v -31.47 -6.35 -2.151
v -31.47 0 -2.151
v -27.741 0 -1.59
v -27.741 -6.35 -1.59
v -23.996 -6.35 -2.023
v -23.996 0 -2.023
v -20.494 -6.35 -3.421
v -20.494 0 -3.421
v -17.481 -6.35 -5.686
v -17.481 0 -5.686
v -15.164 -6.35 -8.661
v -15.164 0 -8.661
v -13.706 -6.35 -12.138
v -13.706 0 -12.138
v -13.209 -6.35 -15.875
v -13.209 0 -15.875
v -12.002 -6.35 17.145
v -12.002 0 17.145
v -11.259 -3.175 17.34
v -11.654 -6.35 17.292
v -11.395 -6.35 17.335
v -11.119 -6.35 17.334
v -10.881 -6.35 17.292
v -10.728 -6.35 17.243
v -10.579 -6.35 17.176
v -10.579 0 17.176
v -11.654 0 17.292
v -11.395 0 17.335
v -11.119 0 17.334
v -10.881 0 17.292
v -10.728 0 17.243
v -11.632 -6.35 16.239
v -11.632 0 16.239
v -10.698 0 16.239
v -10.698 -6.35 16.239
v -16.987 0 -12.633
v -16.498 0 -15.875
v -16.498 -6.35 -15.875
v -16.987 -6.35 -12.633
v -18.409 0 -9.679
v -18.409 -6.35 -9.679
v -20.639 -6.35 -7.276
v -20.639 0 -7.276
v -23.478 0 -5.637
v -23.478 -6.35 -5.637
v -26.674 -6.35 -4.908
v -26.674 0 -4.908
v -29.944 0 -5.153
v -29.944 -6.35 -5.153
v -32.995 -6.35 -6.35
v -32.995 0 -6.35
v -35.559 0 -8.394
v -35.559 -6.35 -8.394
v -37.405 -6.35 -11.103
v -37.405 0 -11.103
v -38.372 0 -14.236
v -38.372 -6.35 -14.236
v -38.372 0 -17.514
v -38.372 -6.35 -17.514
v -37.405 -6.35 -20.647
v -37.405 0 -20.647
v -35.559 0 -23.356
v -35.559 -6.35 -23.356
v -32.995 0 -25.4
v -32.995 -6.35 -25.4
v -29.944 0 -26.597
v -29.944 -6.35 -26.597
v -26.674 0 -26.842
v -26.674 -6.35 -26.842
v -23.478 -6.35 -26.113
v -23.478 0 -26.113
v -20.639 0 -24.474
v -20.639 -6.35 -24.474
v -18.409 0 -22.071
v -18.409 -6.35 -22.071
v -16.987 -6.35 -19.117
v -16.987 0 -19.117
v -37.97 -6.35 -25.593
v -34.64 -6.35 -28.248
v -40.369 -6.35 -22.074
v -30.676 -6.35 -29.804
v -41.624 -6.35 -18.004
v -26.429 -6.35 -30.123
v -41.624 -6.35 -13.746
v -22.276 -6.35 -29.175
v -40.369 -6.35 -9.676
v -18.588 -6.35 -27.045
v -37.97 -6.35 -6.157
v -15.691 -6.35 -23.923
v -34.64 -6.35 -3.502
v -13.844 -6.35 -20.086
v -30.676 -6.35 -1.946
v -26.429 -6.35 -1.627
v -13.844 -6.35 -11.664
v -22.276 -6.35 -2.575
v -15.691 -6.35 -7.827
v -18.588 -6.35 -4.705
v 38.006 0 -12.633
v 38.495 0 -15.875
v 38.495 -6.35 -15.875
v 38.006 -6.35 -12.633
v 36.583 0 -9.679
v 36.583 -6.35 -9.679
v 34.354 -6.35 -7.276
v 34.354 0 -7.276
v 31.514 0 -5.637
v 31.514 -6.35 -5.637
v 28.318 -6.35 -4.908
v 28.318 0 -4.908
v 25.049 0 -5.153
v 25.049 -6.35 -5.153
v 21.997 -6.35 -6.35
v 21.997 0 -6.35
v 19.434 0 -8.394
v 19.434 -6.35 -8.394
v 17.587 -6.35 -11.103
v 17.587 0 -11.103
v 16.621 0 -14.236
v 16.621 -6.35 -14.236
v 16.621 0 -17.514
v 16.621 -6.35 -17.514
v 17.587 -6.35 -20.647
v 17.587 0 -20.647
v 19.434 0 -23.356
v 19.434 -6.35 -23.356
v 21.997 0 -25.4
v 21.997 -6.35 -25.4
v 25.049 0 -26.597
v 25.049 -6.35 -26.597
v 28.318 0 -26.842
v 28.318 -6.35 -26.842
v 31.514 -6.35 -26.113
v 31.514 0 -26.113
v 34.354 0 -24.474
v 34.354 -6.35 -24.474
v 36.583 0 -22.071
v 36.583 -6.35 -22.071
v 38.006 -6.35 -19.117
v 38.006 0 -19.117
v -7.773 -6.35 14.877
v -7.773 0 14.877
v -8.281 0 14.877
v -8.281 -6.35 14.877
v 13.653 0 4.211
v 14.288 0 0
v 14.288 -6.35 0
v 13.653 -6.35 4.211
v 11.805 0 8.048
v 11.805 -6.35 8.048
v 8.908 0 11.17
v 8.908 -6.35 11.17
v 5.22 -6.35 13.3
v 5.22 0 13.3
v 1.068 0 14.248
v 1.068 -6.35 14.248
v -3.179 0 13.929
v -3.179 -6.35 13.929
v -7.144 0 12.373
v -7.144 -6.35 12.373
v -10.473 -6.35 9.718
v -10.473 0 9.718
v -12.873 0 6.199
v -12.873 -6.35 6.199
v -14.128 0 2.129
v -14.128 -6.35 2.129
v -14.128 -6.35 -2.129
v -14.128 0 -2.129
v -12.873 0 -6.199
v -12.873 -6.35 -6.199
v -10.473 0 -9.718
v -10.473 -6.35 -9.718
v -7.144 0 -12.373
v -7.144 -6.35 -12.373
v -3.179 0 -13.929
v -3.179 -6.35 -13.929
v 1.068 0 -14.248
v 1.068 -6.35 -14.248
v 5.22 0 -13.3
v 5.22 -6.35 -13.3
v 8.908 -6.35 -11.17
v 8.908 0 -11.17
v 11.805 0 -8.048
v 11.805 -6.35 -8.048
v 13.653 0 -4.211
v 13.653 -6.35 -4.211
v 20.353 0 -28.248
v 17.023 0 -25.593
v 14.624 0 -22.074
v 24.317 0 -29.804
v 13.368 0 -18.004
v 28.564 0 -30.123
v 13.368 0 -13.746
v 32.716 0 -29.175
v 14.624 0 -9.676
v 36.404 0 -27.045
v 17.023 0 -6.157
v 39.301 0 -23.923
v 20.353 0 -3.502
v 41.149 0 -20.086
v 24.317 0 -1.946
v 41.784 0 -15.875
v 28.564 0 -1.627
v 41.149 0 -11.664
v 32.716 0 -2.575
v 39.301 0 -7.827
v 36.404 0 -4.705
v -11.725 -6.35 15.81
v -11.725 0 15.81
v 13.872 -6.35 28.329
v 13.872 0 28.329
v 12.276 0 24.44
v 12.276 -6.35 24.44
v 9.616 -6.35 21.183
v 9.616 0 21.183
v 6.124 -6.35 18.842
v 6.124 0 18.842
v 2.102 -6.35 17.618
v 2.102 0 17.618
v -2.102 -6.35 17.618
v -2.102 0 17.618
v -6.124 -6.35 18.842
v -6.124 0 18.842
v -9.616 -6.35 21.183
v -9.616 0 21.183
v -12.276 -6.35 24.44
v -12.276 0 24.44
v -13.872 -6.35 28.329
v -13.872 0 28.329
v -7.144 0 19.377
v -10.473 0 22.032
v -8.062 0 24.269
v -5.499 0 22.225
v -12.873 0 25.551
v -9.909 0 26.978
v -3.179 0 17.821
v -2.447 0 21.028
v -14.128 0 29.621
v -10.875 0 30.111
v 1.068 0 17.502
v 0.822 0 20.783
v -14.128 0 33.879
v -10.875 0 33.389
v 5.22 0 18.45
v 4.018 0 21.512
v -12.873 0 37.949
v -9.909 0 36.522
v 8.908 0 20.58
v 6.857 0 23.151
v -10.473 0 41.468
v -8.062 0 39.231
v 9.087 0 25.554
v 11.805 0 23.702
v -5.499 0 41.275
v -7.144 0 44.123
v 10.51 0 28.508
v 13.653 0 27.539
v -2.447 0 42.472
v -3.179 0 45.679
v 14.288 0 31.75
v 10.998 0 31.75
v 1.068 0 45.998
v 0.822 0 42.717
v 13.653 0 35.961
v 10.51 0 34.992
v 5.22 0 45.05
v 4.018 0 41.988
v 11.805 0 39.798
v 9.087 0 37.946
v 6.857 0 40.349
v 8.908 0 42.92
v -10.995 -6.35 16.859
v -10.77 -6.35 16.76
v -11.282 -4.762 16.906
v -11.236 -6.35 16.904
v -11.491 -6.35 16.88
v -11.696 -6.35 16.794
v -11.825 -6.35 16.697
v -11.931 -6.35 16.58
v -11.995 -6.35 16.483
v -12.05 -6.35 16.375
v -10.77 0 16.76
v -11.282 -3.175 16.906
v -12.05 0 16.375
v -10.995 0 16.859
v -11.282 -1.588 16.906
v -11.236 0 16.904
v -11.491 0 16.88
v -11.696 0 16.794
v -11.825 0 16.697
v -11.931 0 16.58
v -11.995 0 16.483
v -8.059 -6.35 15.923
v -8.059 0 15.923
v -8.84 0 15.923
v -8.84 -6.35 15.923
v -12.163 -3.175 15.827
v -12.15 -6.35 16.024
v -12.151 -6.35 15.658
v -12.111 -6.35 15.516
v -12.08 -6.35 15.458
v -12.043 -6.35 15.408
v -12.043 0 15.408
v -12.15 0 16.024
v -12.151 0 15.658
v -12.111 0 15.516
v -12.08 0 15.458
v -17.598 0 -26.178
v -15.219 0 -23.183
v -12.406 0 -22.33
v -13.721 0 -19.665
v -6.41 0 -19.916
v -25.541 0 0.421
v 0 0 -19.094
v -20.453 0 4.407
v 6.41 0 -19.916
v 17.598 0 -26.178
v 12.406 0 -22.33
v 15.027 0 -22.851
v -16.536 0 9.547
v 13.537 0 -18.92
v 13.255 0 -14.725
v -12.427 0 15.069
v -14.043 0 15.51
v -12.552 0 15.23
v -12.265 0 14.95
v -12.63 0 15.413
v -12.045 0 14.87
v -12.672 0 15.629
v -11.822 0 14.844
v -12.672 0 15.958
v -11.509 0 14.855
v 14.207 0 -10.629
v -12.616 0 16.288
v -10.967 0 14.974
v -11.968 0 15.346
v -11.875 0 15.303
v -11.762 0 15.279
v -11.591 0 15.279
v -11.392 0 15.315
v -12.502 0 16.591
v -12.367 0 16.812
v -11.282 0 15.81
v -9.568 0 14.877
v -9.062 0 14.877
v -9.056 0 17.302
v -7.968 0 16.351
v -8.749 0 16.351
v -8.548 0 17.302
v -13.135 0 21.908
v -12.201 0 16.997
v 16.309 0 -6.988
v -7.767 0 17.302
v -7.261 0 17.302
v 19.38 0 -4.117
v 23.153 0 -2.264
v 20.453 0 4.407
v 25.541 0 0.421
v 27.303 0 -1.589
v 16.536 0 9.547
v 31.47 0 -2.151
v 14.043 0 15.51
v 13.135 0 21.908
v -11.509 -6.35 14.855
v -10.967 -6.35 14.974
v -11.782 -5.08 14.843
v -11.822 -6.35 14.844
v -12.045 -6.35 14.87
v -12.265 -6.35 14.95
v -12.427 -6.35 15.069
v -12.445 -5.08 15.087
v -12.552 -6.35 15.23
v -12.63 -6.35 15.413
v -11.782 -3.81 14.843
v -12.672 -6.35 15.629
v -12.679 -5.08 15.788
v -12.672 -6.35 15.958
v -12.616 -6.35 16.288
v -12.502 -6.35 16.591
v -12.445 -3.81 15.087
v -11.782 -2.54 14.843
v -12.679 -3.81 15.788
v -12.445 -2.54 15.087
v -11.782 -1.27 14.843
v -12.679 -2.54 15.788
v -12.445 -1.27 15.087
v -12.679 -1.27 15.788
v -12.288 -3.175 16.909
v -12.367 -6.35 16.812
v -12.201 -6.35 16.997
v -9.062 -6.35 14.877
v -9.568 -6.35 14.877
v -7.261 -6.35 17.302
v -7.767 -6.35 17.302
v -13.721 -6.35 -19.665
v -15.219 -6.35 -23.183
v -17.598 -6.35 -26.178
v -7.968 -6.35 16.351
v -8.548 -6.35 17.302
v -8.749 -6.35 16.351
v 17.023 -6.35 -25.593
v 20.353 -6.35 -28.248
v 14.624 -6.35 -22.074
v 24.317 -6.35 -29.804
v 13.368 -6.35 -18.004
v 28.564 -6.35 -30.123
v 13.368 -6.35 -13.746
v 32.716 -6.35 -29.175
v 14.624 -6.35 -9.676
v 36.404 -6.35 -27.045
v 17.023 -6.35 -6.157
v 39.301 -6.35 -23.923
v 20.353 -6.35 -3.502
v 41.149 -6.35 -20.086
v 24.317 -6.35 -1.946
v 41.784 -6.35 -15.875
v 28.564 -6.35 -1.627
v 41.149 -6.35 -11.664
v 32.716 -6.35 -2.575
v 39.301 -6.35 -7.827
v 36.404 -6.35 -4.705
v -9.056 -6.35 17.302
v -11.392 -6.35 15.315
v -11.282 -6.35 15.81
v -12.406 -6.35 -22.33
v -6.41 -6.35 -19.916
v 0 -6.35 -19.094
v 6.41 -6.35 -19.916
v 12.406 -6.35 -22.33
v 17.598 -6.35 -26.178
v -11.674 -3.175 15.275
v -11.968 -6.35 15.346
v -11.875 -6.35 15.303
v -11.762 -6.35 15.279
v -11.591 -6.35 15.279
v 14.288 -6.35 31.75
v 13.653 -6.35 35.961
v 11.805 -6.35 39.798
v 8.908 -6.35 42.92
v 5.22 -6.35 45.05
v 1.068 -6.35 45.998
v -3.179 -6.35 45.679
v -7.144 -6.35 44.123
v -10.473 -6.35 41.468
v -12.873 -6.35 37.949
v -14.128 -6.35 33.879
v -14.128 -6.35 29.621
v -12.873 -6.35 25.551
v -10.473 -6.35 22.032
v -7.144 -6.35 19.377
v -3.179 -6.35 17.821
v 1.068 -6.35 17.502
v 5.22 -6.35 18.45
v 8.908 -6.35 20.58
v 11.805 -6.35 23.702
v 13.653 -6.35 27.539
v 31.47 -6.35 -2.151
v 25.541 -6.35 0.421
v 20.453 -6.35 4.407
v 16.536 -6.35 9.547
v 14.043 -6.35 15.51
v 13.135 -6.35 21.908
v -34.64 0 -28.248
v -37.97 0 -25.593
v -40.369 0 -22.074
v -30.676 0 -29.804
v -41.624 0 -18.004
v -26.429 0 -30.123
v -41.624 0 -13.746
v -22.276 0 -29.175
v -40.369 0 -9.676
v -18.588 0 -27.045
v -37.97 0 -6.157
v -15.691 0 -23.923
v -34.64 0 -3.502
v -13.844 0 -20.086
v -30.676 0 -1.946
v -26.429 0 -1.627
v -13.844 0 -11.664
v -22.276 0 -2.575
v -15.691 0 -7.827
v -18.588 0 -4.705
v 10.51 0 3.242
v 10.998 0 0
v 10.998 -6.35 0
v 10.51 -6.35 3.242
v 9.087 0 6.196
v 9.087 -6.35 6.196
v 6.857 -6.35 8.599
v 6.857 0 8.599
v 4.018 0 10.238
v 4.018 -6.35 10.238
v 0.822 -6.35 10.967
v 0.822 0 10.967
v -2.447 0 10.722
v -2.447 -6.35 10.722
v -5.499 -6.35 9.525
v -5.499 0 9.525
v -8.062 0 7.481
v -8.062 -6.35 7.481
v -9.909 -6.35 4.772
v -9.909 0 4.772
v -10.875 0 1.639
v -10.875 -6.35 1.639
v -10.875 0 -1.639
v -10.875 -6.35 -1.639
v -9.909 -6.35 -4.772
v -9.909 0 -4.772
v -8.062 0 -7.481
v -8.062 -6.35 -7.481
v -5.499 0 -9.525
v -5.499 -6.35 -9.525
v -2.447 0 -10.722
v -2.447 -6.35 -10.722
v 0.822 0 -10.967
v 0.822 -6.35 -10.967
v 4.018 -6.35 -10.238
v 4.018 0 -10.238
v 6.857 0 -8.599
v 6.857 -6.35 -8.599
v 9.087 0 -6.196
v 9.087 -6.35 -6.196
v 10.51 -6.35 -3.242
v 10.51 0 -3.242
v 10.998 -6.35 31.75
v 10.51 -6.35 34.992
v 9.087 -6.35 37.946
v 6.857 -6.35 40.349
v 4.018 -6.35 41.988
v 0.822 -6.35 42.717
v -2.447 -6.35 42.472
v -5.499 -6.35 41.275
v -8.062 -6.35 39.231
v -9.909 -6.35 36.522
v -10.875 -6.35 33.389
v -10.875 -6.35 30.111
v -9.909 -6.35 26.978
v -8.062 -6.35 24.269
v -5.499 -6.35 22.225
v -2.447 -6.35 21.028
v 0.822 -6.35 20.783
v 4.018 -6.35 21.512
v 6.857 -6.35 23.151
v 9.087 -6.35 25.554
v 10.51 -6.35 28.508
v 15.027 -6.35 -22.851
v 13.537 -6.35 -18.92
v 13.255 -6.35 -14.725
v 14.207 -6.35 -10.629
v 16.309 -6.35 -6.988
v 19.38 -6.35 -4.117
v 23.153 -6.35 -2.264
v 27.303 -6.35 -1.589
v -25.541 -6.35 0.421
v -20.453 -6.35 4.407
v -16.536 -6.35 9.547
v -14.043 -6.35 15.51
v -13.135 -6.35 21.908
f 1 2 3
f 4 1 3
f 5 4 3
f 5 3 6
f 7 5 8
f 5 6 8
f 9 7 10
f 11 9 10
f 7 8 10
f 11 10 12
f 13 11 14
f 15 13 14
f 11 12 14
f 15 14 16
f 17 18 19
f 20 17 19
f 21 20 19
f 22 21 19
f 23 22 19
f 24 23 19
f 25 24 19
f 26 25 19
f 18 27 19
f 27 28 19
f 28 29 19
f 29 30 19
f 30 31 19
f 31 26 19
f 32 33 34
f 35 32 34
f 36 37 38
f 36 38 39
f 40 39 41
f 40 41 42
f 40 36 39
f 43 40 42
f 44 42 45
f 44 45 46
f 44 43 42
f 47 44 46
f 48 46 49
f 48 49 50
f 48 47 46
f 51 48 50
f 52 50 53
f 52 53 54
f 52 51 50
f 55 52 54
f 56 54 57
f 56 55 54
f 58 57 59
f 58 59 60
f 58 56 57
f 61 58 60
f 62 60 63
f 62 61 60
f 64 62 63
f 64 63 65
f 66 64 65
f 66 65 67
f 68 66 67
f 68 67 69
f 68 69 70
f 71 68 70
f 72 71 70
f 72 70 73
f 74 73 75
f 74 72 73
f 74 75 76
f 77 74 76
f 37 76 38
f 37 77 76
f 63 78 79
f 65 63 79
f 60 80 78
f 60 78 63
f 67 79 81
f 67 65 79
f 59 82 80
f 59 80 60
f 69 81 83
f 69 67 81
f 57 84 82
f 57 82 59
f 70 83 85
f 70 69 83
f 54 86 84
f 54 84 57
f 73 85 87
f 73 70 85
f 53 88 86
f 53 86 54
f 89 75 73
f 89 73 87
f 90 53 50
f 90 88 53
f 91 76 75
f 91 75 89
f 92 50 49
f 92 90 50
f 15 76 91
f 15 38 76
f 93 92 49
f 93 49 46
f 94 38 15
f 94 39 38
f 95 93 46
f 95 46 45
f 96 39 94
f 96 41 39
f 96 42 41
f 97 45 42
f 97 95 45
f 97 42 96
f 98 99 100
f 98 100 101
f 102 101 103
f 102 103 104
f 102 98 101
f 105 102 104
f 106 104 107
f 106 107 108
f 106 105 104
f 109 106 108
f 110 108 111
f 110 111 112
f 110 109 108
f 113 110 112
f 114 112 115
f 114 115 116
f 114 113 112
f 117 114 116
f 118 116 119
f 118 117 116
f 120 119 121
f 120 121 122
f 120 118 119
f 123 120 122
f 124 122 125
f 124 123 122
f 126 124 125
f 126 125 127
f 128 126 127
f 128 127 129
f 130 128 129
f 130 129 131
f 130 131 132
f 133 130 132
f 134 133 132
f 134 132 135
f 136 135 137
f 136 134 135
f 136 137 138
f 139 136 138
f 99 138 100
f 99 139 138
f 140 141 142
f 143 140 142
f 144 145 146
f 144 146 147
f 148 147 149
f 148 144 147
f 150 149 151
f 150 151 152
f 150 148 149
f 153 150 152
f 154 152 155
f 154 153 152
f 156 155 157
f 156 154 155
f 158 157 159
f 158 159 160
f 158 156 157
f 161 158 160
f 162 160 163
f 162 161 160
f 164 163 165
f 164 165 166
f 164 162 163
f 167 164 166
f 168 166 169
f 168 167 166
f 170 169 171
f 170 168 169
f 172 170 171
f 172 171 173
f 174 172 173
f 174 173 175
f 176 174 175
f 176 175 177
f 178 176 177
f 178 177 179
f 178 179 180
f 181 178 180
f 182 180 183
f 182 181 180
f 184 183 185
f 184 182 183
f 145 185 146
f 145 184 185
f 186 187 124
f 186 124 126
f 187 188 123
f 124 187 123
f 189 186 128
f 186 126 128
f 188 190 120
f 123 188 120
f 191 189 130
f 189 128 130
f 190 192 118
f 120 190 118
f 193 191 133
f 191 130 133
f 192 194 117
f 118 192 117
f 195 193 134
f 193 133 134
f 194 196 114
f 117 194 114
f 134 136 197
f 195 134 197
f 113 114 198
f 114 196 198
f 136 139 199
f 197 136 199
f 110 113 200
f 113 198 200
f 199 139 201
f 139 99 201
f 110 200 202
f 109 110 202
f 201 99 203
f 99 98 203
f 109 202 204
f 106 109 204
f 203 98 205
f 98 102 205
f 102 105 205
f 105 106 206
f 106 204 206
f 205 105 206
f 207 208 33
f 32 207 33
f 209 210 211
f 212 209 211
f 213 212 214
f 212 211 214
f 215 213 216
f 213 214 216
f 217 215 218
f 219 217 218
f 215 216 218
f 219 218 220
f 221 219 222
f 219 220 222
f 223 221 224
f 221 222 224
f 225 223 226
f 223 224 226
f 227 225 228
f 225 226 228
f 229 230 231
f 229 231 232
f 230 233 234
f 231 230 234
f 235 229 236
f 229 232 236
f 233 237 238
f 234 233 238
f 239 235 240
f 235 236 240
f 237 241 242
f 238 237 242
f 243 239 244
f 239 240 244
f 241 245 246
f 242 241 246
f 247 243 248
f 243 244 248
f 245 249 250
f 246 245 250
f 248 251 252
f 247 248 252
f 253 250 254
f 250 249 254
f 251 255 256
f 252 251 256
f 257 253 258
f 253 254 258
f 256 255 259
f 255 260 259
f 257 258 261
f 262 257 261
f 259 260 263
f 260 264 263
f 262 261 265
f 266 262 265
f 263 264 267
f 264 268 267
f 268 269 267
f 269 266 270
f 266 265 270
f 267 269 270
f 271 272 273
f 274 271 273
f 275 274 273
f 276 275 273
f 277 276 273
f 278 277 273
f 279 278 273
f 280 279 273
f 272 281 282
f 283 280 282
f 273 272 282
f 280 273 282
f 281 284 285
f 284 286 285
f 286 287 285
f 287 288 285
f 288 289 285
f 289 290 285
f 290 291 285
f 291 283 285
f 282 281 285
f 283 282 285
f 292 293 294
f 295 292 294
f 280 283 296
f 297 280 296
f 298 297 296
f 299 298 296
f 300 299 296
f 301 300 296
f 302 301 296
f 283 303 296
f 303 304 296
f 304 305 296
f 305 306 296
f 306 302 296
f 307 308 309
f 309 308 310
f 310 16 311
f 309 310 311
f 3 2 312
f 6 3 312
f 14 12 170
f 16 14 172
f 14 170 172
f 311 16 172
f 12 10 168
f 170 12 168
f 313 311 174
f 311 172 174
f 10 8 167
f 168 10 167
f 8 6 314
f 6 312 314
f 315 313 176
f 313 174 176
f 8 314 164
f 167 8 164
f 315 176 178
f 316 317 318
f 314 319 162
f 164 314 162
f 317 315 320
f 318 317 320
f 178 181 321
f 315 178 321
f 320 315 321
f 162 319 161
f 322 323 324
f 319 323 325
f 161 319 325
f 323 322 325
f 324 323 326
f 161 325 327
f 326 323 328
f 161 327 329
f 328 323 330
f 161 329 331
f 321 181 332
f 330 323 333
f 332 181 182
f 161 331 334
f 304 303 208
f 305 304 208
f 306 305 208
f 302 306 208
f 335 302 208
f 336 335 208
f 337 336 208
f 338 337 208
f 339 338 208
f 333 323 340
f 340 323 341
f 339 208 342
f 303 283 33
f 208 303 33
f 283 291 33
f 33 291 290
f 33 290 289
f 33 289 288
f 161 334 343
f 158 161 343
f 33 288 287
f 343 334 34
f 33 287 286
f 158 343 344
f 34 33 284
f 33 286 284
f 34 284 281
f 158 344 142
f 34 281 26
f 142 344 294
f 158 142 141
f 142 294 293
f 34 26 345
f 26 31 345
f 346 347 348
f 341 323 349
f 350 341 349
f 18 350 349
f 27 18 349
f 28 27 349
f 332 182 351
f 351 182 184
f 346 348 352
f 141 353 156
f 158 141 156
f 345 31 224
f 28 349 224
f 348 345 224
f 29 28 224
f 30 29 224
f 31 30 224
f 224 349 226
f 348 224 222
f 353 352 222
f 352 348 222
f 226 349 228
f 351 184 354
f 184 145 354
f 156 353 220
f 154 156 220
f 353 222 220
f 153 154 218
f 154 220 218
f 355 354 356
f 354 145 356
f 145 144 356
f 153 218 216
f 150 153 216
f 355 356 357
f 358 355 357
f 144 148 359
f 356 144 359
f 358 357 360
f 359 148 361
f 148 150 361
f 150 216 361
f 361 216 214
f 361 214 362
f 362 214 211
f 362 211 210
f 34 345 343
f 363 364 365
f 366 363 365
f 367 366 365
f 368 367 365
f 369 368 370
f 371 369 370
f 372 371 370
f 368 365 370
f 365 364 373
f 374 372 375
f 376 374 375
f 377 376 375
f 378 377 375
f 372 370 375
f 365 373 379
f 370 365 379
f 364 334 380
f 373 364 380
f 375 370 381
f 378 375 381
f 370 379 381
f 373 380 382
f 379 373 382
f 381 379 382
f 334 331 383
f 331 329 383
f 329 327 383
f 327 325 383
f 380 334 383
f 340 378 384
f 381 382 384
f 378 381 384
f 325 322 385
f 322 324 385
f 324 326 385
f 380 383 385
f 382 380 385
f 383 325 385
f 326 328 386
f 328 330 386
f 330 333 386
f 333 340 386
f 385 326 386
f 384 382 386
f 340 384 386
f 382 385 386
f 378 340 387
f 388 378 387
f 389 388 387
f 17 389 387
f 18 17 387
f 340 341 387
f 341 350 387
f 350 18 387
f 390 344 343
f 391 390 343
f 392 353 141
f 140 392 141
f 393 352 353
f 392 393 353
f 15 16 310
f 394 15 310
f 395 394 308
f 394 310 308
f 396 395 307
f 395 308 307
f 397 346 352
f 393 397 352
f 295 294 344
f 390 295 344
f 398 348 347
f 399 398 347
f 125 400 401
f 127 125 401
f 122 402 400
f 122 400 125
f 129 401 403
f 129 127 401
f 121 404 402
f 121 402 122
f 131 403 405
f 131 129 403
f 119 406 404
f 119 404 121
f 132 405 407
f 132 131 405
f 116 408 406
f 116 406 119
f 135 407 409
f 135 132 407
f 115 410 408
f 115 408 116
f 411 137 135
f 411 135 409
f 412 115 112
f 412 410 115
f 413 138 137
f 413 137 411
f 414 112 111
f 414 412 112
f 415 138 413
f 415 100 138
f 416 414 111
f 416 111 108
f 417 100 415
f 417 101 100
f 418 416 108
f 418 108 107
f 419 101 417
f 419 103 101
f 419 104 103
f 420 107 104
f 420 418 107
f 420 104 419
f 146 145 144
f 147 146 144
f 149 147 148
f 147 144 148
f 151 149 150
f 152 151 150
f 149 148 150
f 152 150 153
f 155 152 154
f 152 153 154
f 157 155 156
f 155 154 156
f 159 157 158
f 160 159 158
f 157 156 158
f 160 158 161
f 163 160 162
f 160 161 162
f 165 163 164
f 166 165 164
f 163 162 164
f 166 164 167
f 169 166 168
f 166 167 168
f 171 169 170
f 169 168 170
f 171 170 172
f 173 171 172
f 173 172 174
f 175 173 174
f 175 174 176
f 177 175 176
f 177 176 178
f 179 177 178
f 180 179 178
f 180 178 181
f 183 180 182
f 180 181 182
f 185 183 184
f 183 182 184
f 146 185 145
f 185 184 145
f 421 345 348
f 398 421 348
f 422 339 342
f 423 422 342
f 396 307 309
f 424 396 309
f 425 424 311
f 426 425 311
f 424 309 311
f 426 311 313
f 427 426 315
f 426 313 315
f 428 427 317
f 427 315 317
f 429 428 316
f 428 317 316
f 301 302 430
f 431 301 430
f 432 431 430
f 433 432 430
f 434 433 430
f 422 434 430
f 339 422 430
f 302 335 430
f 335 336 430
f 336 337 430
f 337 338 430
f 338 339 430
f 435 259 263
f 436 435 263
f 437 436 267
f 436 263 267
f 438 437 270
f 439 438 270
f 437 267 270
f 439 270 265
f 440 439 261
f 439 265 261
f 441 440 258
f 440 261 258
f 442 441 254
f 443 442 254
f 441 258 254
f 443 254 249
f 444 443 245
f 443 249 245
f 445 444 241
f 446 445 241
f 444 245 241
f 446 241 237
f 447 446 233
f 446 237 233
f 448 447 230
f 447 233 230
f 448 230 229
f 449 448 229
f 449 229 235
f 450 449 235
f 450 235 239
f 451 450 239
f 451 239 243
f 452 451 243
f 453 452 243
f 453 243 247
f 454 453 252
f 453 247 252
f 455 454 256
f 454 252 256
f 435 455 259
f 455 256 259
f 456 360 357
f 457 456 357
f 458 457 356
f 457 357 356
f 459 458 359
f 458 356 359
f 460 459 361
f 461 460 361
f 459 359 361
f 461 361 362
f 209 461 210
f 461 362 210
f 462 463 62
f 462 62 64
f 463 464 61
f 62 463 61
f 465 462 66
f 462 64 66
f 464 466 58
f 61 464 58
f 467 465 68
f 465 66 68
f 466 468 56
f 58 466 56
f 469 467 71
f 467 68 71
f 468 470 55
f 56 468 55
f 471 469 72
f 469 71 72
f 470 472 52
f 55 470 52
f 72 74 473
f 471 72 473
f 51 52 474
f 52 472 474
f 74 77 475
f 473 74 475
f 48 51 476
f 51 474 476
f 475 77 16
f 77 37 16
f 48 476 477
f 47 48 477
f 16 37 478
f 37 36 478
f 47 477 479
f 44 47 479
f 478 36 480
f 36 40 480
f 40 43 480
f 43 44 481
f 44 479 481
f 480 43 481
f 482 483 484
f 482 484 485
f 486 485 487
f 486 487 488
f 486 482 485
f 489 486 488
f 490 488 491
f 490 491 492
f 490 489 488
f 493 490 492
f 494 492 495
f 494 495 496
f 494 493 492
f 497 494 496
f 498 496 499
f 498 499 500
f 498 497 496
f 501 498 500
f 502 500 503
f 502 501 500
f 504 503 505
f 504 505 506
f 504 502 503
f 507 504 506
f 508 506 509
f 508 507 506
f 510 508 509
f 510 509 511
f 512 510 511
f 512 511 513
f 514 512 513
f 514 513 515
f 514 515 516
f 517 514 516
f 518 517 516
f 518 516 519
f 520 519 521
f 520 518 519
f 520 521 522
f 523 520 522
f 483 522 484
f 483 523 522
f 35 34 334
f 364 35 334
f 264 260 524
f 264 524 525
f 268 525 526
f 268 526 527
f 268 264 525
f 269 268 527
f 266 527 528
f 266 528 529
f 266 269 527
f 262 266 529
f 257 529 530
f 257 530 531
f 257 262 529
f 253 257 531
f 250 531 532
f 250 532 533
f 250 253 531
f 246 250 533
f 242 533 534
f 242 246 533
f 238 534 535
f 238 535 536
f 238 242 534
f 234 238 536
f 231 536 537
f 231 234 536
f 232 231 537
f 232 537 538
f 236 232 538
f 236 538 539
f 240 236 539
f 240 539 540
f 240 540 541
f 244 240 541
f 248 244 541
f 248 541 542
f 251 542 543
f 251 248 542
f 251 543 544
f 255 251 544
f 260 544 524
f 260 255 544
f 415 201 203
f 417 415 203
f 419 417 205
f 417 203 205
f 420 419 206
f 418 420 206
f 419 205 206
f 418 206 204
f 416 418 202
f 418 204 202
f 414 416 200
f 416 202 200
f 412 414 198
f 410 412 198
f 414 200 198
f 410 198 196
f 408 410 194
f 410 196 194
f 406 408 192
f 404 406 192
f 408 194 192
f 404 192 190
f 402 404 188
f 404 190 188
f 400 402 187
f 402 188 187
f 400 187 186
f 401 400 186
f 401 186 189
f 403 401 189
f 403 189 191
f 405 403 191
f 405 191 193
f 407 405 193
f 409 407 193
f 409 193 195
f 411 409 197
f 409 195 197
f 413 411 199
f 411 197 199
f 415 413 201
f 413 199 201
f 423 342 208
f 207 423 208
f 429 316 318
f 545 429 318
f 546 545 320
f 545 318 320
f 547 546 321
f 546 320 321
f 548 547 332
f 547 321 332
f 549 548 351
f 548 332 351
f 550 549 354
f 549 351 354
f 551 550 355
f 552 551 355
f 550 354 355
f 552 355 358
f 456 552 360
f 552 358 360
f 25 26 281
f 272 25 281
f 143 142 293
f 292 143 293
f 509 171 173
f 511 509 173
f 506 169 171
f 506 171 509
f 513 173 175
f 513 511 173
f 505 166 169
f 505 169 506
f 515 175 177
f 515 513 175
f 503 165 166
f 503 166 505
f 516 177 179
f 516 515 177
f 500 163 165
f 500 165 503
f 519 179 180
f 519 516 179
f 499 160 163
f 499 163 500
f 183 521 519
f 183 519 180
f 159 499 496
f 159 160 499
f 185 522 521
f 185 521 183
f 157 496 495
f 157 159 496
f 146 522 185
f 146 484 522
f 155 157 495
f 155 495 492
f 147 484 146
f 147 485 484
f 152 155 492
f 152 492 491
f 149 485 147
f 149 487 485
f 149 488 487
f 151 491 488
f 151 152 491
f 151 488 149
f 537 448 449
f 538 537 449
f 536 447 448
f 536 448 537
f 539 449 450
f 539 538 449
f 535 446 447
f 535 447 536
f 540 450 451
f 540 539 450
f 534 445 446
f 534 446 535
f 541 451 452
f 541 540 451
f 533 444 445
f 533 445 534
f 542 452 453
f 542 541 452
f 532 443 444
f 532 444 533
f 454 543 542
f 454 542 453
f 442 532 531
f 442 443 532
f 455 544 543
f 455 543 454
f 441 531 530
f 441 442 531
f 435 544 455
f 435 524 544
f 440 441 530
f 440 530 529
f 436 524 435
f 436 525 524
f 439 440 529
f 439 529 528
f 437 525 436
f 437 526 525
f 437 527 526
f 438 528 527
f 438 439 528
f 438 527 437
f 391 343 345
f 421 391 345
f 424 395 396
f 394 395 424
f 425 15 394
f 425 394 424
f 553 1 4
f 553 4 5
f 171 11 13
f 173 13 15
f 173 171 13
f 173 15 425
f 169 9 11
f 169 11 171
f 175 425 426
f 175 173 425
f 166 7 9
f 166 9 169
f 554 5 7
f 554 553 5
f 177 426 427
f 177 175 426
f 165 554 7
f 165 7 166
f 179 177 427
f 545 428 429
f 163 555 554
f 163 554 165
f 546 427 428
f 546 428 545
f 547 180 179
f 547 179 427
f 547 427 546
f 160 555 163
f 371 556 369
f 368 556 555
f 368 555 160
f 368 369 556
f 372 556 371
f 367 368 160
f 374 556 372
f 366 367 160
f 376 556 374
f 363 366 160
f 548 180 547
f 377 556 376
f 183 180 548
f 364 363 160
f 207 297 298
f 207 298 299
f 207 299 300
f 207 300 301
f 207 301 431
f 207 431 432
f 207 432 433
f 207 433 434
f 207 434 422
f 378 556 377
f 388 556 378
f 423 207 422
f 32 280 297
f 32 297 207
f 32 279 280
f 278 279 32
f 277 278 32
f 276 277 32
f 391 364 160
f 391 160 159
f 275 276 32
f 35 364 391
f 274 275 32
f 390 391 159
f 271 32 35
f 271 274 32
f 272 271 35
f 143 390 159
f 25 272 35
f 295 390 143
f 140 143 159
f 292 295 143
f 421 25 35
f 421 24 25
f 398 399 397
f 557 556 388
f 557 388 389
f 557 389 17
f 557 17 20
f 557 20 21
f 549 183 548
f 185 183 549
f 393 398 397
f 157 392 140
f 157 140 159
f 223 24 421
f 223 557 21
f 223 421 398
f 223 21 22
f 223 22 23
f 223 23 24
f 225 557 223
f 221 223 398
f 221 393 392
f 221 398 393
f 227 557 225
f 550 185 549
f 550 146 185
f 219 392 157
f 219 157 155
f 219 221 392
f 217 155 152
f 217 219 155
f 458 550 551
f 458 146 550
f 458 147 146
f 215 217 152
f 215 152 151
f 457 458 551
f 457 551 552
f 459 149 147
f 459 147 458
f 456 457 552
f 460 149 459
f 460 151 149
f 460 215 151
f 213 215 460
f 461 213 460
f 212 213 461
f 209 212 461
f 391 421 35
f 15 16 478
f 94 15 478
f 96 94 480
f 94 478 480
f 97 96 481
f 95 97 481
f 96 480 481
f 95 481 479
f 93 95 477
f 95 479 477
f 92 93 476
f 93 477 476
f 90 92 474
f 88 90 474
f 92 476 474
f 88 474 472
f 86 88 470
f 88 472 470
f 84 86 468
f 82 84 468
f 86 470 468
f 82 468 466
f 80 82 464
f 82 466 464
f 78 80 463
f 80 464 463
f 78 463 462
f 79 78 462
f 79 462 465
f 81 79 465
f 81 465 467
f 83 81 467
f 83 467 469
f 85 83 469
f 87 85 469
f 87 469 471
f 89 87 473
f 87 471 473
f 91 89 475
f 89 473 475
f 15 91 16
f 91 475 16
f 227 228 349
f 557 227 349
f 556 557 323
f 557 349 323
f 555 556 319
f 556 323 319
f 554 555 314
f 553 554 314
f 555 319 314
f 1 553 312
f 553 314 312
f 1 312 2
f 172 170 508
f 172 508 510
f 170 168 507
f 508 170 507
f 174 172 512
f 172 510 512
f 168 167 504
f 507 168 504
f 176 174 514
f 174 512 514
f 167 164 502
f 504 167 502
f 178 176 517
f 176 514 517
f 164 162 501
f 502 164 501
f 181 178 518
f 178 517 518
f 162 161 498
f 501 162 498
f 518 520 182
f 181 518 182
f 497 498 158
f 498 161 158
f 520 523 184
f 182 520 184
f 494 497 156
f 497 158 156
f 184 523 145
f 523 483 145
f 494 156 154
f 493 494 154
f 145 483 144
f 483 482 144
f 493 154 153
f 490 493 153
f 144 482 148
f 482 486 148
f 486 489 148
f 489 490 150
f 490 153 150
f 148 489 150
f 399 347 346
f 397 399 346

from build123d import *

# Parameters (mm, degrees)
F0_R     = 14.2875
F0_R_2   = 10.9982
F3_DEPTH = 6.35
F1_R     = 14.2875
F1_R_2   = 10.9982
F2_R     = 14.2875


with BuildPart() as f3:
    # F0 (on Front) → F3 (new body)
    with BuildSketch(Plane.XZ):
        with Locations((0, 31.75)):
            Circle(F0_R)
        with Locations((0, 31.75)):
            Circle(F0_R_2, mode=Mode.SUBTRACT)
    extrude(amount=F3_DEPTH)


with BuildPart() as f3b:
    # F0 (on Front) → F3, piece 2 (new body)
    with BuildSketch(Plane.XZ):
        Circle(F0_R)
        Circle(F0_R_2, mode=Mode.SUBTRACT)
    extrude(amount=F3_DEPTH)


with BuildPart() as f3c:
    # F1 (on Front) → F3, piece 3 (new body)
    with BuildSketch(Plane.XZ):
        with Locations((-27.4963065702, -15.875)):
            Circle(F1_R)
        with Locations((-27.4963065702, -15.875)):
            Circle(F1_R_2, mode=Mode.SUBTRACT)
    extrude(amount=F3_DEPTH)


with BuildPart() as f3d:
    # F1 (on Front) → F3, piece 4 (new body)
    with BuildSketch(Plane.XZ):
        with Locations((27.4963065702, -15.875)):
            Circle(F1_R)
        with Locations((27.4963065702, -15.875)):
            Circle(F1_R_2, mode=Mode.SUBTRACT)
    extrude(amount=F3_DEPTH)


with BuildPart() as f3e:
    # F2 (on Front) → F3, piece 5 (new body)
    with BuildSketch(Plane.XZ):
        with BuildLine():
            ThreePointArc((-31.4695122777, -2.1510686152), (-18.912441482, -4.4535326513), (-13.2088065702, -15.875))
            ThreePointArc((-13.2088065702, -15.875), (-14.3517276668, -21.4743483284), (-17.5976362049, -26.1778627696))
            ThreePointArc((-17.5976362049, -26.1778627696), (0, -19.094063249), (17.5976362049, -26.1778627696))
            ThreePointArc((17.5976362049, -26.1778627696), (15.1229686136, -8.73125), (31.4695122777, -2.1510686152))
            ThreePointArc((31.4695122777, -2.1510686152), (16.5359438351, 9.5470316245), (13.8718760728, 28.3289313848))
            ThreePointArc((13.8718760728, 28.3289313848), (0, 17.4625), (-13.8718760728, 28.3289313848))
            ThreePointArc((-13.8718760728, 28.3289313848), (-16.5359438351, 9.5470316245), (-31.4695122777, -2.1510686152))
        make_face()
        Circle(F2_R, mode=Mode.SUBTRACT)
        with BuildLine():
            Line((-11.7253271455, 15.8104161092), (-11.6324328119, 16.2387916935))
            Line((-11.6324328119, 16.2387916935), (-10.6981812278, 16.2387916935))
            Line((-10.6981812278, 16.2387916935), (-10.967309383, 14.9743671063))
            add(Edge.make_bspline(
                [(-10.967309383, 14.9743671063), (-11.1891941342, 14.8984591651), (-11.3792293996, 14.8708562774)],
                knots=[0, 0, 0, 1, 1, 1], degree=2))
            add(Edge.make_bspline(
                [(-11.3792293996, 14.8708562774), (-11.569264665, 14.8432533897), (-11.7815945705, 14.8432533897)],
                knots=[0, 0, 0, 1, 1, 1], degree=2))
            add(Edge.make_bspline(
                [(-11.7815945705, 14.8432533897), (-12.2110318043, 14.8432533897), (-12.4451255251, 15.0871673686)],
                knots=[0, 0, 0, 1, 1, 1], degree=2))
            add(Edge.make_bspline(
                [(-12.4451255251, 15.0871673686), (-12.6792192459, 15.3310813475), (-12.6792192459, 15.7875906443)],
                knots=[0, 0, 0, 1, 1, 1], degree=2))
            add(Edge.make_bspline(
                [(-12.6792192459, 15.7875906443), (-12.6792192459, 16.2318909715), (-12.5016583625, 16.5909939242)],
                knots=[0, 0, 0, 1, 1, 1], degree=2))
            add(Edge.make_bspline(
                [(-12.5016583625, 16.5909939242), (-12.324097479, 16.9500968768), (-12.0021522598, 17.1451749775)],
                knots=[0, 0, 0, 1, 1, 1], degree=2))
            add(Edge.make_bspline(
                [(-12.0021522598, 17.1451749775), (-11.6802070406, 17.3402530781), (-11.259263003, 17.3402530781)],
                knots=[0, 0, 0, 1, 1, 1], degree=2))
            add(Edge.make_bspline(
                [(-11.259263003, 17.3402530781), (-10.8972405142, 17.3402530781), (-10.5787456559, 17.1756974014)],
                knots=[0, 0, 0, 1, 1, 1], degree=2))
            Line((-10.5787456559, 17.1756974014), (-10.7698425709, 16.7595307867))
            add(Edge.make_bspline(
                [(-10.7698425709, 16.7595307867), (-10.8924630913, 16.8258838821), (-11.0150836117, 16.8656957394)],
                knots=[0, 0, 0, 1, 1, 1], degree=2))
            add(Edge.make_bspline(
                [(-11.0150836117, 16.8656957394), (-11.1377041321, 16.9055075967), (-11.2820884679, 16.9055075967)],
                knots=[0, 0, 0, 1, 1, 1], degree=2))
            add(Edge.make_bspline(
                [(-11.2820884679, 16.9055075967), (-11.5358227049, 16.9055075967), (-11.7359436408, 16.7677585705)],
                knots=[0, 0, 0, 1, 1, 1], degree=2))
            add(Edge.make_bspline(
                [(-11.7359436408, 16.7677585705), (-11.9360645767, 16.6300095443), (-12.0496610762, 16.3754790701)],
                knots=[0, 0, 0, 1, 1, 1], degree=2))
            add(Edge.make_bspline(
                [(-12.0496610762, 16.3754790701), (-12.1632575756, 16.1209485959), (-12.1632575756, 15.8274025016)],
                knots=[0, 0, 0, 1, 1, 1], degree=2))
            add(Edge.make_bspline(
                [(-12.1632575756, 15.8274025016), (-12.1632575756, 15.5418187787), (-12.0430257666, 15.4083163507)],
                knots=[0, 0, 0, 1, 1, 1], degree=2))
            add(Edge.make_bspline(
                [(-12.0430257666, 15.4083163507), (-11.9227939576, 15.2748139226), (-11.6738371435, 15.2748139226)],
                knots=[0, 0, 0, 1, 1, 1], degree=2))
            add(Edge.make_bspline(
                [(-11.6738371435, 15.2748139226), (-11.5475008497, 15.2748139226), (-11.3919691939, 15.3146257799)],
                knots=[0, 0, 0, 1, 1, 1], degree=2))
            Line((-11.3919691939, 15.3146257799), (-11.2820884679, 15.8104161092))
            Line((-11.2820884679, 15.8104161092), (-11.7253271455, 15.8104161092))
        make_face(mode=Mode.SUBTRACT)
        Polygon((-7.2605600581, 17.3020336952), (-7.7733367798, 14.8766953498), (-8.2808052539, 14.8766953498), (-8.0589205027, 15.9234817838), (-8.8397637301, 15.9234817838), (-9.0621793061, 14.8766953498), (-9.5680553059, 14.8766953498), (-9.0558094089, 17.3020336952), (-8.54781011, 17.3020336952), (-8.7489926955, 16.3513265434), (-7.9676186433, 16.3513265434), (-7.7669668826, 17.3020336952), align=None, mode=Mode.SUBTRACT)
    extrude(amount=F3_DEPTH)


solid = Compound([f3.part, f3b.part, f3c.part, f3d.part, f3e.part])
